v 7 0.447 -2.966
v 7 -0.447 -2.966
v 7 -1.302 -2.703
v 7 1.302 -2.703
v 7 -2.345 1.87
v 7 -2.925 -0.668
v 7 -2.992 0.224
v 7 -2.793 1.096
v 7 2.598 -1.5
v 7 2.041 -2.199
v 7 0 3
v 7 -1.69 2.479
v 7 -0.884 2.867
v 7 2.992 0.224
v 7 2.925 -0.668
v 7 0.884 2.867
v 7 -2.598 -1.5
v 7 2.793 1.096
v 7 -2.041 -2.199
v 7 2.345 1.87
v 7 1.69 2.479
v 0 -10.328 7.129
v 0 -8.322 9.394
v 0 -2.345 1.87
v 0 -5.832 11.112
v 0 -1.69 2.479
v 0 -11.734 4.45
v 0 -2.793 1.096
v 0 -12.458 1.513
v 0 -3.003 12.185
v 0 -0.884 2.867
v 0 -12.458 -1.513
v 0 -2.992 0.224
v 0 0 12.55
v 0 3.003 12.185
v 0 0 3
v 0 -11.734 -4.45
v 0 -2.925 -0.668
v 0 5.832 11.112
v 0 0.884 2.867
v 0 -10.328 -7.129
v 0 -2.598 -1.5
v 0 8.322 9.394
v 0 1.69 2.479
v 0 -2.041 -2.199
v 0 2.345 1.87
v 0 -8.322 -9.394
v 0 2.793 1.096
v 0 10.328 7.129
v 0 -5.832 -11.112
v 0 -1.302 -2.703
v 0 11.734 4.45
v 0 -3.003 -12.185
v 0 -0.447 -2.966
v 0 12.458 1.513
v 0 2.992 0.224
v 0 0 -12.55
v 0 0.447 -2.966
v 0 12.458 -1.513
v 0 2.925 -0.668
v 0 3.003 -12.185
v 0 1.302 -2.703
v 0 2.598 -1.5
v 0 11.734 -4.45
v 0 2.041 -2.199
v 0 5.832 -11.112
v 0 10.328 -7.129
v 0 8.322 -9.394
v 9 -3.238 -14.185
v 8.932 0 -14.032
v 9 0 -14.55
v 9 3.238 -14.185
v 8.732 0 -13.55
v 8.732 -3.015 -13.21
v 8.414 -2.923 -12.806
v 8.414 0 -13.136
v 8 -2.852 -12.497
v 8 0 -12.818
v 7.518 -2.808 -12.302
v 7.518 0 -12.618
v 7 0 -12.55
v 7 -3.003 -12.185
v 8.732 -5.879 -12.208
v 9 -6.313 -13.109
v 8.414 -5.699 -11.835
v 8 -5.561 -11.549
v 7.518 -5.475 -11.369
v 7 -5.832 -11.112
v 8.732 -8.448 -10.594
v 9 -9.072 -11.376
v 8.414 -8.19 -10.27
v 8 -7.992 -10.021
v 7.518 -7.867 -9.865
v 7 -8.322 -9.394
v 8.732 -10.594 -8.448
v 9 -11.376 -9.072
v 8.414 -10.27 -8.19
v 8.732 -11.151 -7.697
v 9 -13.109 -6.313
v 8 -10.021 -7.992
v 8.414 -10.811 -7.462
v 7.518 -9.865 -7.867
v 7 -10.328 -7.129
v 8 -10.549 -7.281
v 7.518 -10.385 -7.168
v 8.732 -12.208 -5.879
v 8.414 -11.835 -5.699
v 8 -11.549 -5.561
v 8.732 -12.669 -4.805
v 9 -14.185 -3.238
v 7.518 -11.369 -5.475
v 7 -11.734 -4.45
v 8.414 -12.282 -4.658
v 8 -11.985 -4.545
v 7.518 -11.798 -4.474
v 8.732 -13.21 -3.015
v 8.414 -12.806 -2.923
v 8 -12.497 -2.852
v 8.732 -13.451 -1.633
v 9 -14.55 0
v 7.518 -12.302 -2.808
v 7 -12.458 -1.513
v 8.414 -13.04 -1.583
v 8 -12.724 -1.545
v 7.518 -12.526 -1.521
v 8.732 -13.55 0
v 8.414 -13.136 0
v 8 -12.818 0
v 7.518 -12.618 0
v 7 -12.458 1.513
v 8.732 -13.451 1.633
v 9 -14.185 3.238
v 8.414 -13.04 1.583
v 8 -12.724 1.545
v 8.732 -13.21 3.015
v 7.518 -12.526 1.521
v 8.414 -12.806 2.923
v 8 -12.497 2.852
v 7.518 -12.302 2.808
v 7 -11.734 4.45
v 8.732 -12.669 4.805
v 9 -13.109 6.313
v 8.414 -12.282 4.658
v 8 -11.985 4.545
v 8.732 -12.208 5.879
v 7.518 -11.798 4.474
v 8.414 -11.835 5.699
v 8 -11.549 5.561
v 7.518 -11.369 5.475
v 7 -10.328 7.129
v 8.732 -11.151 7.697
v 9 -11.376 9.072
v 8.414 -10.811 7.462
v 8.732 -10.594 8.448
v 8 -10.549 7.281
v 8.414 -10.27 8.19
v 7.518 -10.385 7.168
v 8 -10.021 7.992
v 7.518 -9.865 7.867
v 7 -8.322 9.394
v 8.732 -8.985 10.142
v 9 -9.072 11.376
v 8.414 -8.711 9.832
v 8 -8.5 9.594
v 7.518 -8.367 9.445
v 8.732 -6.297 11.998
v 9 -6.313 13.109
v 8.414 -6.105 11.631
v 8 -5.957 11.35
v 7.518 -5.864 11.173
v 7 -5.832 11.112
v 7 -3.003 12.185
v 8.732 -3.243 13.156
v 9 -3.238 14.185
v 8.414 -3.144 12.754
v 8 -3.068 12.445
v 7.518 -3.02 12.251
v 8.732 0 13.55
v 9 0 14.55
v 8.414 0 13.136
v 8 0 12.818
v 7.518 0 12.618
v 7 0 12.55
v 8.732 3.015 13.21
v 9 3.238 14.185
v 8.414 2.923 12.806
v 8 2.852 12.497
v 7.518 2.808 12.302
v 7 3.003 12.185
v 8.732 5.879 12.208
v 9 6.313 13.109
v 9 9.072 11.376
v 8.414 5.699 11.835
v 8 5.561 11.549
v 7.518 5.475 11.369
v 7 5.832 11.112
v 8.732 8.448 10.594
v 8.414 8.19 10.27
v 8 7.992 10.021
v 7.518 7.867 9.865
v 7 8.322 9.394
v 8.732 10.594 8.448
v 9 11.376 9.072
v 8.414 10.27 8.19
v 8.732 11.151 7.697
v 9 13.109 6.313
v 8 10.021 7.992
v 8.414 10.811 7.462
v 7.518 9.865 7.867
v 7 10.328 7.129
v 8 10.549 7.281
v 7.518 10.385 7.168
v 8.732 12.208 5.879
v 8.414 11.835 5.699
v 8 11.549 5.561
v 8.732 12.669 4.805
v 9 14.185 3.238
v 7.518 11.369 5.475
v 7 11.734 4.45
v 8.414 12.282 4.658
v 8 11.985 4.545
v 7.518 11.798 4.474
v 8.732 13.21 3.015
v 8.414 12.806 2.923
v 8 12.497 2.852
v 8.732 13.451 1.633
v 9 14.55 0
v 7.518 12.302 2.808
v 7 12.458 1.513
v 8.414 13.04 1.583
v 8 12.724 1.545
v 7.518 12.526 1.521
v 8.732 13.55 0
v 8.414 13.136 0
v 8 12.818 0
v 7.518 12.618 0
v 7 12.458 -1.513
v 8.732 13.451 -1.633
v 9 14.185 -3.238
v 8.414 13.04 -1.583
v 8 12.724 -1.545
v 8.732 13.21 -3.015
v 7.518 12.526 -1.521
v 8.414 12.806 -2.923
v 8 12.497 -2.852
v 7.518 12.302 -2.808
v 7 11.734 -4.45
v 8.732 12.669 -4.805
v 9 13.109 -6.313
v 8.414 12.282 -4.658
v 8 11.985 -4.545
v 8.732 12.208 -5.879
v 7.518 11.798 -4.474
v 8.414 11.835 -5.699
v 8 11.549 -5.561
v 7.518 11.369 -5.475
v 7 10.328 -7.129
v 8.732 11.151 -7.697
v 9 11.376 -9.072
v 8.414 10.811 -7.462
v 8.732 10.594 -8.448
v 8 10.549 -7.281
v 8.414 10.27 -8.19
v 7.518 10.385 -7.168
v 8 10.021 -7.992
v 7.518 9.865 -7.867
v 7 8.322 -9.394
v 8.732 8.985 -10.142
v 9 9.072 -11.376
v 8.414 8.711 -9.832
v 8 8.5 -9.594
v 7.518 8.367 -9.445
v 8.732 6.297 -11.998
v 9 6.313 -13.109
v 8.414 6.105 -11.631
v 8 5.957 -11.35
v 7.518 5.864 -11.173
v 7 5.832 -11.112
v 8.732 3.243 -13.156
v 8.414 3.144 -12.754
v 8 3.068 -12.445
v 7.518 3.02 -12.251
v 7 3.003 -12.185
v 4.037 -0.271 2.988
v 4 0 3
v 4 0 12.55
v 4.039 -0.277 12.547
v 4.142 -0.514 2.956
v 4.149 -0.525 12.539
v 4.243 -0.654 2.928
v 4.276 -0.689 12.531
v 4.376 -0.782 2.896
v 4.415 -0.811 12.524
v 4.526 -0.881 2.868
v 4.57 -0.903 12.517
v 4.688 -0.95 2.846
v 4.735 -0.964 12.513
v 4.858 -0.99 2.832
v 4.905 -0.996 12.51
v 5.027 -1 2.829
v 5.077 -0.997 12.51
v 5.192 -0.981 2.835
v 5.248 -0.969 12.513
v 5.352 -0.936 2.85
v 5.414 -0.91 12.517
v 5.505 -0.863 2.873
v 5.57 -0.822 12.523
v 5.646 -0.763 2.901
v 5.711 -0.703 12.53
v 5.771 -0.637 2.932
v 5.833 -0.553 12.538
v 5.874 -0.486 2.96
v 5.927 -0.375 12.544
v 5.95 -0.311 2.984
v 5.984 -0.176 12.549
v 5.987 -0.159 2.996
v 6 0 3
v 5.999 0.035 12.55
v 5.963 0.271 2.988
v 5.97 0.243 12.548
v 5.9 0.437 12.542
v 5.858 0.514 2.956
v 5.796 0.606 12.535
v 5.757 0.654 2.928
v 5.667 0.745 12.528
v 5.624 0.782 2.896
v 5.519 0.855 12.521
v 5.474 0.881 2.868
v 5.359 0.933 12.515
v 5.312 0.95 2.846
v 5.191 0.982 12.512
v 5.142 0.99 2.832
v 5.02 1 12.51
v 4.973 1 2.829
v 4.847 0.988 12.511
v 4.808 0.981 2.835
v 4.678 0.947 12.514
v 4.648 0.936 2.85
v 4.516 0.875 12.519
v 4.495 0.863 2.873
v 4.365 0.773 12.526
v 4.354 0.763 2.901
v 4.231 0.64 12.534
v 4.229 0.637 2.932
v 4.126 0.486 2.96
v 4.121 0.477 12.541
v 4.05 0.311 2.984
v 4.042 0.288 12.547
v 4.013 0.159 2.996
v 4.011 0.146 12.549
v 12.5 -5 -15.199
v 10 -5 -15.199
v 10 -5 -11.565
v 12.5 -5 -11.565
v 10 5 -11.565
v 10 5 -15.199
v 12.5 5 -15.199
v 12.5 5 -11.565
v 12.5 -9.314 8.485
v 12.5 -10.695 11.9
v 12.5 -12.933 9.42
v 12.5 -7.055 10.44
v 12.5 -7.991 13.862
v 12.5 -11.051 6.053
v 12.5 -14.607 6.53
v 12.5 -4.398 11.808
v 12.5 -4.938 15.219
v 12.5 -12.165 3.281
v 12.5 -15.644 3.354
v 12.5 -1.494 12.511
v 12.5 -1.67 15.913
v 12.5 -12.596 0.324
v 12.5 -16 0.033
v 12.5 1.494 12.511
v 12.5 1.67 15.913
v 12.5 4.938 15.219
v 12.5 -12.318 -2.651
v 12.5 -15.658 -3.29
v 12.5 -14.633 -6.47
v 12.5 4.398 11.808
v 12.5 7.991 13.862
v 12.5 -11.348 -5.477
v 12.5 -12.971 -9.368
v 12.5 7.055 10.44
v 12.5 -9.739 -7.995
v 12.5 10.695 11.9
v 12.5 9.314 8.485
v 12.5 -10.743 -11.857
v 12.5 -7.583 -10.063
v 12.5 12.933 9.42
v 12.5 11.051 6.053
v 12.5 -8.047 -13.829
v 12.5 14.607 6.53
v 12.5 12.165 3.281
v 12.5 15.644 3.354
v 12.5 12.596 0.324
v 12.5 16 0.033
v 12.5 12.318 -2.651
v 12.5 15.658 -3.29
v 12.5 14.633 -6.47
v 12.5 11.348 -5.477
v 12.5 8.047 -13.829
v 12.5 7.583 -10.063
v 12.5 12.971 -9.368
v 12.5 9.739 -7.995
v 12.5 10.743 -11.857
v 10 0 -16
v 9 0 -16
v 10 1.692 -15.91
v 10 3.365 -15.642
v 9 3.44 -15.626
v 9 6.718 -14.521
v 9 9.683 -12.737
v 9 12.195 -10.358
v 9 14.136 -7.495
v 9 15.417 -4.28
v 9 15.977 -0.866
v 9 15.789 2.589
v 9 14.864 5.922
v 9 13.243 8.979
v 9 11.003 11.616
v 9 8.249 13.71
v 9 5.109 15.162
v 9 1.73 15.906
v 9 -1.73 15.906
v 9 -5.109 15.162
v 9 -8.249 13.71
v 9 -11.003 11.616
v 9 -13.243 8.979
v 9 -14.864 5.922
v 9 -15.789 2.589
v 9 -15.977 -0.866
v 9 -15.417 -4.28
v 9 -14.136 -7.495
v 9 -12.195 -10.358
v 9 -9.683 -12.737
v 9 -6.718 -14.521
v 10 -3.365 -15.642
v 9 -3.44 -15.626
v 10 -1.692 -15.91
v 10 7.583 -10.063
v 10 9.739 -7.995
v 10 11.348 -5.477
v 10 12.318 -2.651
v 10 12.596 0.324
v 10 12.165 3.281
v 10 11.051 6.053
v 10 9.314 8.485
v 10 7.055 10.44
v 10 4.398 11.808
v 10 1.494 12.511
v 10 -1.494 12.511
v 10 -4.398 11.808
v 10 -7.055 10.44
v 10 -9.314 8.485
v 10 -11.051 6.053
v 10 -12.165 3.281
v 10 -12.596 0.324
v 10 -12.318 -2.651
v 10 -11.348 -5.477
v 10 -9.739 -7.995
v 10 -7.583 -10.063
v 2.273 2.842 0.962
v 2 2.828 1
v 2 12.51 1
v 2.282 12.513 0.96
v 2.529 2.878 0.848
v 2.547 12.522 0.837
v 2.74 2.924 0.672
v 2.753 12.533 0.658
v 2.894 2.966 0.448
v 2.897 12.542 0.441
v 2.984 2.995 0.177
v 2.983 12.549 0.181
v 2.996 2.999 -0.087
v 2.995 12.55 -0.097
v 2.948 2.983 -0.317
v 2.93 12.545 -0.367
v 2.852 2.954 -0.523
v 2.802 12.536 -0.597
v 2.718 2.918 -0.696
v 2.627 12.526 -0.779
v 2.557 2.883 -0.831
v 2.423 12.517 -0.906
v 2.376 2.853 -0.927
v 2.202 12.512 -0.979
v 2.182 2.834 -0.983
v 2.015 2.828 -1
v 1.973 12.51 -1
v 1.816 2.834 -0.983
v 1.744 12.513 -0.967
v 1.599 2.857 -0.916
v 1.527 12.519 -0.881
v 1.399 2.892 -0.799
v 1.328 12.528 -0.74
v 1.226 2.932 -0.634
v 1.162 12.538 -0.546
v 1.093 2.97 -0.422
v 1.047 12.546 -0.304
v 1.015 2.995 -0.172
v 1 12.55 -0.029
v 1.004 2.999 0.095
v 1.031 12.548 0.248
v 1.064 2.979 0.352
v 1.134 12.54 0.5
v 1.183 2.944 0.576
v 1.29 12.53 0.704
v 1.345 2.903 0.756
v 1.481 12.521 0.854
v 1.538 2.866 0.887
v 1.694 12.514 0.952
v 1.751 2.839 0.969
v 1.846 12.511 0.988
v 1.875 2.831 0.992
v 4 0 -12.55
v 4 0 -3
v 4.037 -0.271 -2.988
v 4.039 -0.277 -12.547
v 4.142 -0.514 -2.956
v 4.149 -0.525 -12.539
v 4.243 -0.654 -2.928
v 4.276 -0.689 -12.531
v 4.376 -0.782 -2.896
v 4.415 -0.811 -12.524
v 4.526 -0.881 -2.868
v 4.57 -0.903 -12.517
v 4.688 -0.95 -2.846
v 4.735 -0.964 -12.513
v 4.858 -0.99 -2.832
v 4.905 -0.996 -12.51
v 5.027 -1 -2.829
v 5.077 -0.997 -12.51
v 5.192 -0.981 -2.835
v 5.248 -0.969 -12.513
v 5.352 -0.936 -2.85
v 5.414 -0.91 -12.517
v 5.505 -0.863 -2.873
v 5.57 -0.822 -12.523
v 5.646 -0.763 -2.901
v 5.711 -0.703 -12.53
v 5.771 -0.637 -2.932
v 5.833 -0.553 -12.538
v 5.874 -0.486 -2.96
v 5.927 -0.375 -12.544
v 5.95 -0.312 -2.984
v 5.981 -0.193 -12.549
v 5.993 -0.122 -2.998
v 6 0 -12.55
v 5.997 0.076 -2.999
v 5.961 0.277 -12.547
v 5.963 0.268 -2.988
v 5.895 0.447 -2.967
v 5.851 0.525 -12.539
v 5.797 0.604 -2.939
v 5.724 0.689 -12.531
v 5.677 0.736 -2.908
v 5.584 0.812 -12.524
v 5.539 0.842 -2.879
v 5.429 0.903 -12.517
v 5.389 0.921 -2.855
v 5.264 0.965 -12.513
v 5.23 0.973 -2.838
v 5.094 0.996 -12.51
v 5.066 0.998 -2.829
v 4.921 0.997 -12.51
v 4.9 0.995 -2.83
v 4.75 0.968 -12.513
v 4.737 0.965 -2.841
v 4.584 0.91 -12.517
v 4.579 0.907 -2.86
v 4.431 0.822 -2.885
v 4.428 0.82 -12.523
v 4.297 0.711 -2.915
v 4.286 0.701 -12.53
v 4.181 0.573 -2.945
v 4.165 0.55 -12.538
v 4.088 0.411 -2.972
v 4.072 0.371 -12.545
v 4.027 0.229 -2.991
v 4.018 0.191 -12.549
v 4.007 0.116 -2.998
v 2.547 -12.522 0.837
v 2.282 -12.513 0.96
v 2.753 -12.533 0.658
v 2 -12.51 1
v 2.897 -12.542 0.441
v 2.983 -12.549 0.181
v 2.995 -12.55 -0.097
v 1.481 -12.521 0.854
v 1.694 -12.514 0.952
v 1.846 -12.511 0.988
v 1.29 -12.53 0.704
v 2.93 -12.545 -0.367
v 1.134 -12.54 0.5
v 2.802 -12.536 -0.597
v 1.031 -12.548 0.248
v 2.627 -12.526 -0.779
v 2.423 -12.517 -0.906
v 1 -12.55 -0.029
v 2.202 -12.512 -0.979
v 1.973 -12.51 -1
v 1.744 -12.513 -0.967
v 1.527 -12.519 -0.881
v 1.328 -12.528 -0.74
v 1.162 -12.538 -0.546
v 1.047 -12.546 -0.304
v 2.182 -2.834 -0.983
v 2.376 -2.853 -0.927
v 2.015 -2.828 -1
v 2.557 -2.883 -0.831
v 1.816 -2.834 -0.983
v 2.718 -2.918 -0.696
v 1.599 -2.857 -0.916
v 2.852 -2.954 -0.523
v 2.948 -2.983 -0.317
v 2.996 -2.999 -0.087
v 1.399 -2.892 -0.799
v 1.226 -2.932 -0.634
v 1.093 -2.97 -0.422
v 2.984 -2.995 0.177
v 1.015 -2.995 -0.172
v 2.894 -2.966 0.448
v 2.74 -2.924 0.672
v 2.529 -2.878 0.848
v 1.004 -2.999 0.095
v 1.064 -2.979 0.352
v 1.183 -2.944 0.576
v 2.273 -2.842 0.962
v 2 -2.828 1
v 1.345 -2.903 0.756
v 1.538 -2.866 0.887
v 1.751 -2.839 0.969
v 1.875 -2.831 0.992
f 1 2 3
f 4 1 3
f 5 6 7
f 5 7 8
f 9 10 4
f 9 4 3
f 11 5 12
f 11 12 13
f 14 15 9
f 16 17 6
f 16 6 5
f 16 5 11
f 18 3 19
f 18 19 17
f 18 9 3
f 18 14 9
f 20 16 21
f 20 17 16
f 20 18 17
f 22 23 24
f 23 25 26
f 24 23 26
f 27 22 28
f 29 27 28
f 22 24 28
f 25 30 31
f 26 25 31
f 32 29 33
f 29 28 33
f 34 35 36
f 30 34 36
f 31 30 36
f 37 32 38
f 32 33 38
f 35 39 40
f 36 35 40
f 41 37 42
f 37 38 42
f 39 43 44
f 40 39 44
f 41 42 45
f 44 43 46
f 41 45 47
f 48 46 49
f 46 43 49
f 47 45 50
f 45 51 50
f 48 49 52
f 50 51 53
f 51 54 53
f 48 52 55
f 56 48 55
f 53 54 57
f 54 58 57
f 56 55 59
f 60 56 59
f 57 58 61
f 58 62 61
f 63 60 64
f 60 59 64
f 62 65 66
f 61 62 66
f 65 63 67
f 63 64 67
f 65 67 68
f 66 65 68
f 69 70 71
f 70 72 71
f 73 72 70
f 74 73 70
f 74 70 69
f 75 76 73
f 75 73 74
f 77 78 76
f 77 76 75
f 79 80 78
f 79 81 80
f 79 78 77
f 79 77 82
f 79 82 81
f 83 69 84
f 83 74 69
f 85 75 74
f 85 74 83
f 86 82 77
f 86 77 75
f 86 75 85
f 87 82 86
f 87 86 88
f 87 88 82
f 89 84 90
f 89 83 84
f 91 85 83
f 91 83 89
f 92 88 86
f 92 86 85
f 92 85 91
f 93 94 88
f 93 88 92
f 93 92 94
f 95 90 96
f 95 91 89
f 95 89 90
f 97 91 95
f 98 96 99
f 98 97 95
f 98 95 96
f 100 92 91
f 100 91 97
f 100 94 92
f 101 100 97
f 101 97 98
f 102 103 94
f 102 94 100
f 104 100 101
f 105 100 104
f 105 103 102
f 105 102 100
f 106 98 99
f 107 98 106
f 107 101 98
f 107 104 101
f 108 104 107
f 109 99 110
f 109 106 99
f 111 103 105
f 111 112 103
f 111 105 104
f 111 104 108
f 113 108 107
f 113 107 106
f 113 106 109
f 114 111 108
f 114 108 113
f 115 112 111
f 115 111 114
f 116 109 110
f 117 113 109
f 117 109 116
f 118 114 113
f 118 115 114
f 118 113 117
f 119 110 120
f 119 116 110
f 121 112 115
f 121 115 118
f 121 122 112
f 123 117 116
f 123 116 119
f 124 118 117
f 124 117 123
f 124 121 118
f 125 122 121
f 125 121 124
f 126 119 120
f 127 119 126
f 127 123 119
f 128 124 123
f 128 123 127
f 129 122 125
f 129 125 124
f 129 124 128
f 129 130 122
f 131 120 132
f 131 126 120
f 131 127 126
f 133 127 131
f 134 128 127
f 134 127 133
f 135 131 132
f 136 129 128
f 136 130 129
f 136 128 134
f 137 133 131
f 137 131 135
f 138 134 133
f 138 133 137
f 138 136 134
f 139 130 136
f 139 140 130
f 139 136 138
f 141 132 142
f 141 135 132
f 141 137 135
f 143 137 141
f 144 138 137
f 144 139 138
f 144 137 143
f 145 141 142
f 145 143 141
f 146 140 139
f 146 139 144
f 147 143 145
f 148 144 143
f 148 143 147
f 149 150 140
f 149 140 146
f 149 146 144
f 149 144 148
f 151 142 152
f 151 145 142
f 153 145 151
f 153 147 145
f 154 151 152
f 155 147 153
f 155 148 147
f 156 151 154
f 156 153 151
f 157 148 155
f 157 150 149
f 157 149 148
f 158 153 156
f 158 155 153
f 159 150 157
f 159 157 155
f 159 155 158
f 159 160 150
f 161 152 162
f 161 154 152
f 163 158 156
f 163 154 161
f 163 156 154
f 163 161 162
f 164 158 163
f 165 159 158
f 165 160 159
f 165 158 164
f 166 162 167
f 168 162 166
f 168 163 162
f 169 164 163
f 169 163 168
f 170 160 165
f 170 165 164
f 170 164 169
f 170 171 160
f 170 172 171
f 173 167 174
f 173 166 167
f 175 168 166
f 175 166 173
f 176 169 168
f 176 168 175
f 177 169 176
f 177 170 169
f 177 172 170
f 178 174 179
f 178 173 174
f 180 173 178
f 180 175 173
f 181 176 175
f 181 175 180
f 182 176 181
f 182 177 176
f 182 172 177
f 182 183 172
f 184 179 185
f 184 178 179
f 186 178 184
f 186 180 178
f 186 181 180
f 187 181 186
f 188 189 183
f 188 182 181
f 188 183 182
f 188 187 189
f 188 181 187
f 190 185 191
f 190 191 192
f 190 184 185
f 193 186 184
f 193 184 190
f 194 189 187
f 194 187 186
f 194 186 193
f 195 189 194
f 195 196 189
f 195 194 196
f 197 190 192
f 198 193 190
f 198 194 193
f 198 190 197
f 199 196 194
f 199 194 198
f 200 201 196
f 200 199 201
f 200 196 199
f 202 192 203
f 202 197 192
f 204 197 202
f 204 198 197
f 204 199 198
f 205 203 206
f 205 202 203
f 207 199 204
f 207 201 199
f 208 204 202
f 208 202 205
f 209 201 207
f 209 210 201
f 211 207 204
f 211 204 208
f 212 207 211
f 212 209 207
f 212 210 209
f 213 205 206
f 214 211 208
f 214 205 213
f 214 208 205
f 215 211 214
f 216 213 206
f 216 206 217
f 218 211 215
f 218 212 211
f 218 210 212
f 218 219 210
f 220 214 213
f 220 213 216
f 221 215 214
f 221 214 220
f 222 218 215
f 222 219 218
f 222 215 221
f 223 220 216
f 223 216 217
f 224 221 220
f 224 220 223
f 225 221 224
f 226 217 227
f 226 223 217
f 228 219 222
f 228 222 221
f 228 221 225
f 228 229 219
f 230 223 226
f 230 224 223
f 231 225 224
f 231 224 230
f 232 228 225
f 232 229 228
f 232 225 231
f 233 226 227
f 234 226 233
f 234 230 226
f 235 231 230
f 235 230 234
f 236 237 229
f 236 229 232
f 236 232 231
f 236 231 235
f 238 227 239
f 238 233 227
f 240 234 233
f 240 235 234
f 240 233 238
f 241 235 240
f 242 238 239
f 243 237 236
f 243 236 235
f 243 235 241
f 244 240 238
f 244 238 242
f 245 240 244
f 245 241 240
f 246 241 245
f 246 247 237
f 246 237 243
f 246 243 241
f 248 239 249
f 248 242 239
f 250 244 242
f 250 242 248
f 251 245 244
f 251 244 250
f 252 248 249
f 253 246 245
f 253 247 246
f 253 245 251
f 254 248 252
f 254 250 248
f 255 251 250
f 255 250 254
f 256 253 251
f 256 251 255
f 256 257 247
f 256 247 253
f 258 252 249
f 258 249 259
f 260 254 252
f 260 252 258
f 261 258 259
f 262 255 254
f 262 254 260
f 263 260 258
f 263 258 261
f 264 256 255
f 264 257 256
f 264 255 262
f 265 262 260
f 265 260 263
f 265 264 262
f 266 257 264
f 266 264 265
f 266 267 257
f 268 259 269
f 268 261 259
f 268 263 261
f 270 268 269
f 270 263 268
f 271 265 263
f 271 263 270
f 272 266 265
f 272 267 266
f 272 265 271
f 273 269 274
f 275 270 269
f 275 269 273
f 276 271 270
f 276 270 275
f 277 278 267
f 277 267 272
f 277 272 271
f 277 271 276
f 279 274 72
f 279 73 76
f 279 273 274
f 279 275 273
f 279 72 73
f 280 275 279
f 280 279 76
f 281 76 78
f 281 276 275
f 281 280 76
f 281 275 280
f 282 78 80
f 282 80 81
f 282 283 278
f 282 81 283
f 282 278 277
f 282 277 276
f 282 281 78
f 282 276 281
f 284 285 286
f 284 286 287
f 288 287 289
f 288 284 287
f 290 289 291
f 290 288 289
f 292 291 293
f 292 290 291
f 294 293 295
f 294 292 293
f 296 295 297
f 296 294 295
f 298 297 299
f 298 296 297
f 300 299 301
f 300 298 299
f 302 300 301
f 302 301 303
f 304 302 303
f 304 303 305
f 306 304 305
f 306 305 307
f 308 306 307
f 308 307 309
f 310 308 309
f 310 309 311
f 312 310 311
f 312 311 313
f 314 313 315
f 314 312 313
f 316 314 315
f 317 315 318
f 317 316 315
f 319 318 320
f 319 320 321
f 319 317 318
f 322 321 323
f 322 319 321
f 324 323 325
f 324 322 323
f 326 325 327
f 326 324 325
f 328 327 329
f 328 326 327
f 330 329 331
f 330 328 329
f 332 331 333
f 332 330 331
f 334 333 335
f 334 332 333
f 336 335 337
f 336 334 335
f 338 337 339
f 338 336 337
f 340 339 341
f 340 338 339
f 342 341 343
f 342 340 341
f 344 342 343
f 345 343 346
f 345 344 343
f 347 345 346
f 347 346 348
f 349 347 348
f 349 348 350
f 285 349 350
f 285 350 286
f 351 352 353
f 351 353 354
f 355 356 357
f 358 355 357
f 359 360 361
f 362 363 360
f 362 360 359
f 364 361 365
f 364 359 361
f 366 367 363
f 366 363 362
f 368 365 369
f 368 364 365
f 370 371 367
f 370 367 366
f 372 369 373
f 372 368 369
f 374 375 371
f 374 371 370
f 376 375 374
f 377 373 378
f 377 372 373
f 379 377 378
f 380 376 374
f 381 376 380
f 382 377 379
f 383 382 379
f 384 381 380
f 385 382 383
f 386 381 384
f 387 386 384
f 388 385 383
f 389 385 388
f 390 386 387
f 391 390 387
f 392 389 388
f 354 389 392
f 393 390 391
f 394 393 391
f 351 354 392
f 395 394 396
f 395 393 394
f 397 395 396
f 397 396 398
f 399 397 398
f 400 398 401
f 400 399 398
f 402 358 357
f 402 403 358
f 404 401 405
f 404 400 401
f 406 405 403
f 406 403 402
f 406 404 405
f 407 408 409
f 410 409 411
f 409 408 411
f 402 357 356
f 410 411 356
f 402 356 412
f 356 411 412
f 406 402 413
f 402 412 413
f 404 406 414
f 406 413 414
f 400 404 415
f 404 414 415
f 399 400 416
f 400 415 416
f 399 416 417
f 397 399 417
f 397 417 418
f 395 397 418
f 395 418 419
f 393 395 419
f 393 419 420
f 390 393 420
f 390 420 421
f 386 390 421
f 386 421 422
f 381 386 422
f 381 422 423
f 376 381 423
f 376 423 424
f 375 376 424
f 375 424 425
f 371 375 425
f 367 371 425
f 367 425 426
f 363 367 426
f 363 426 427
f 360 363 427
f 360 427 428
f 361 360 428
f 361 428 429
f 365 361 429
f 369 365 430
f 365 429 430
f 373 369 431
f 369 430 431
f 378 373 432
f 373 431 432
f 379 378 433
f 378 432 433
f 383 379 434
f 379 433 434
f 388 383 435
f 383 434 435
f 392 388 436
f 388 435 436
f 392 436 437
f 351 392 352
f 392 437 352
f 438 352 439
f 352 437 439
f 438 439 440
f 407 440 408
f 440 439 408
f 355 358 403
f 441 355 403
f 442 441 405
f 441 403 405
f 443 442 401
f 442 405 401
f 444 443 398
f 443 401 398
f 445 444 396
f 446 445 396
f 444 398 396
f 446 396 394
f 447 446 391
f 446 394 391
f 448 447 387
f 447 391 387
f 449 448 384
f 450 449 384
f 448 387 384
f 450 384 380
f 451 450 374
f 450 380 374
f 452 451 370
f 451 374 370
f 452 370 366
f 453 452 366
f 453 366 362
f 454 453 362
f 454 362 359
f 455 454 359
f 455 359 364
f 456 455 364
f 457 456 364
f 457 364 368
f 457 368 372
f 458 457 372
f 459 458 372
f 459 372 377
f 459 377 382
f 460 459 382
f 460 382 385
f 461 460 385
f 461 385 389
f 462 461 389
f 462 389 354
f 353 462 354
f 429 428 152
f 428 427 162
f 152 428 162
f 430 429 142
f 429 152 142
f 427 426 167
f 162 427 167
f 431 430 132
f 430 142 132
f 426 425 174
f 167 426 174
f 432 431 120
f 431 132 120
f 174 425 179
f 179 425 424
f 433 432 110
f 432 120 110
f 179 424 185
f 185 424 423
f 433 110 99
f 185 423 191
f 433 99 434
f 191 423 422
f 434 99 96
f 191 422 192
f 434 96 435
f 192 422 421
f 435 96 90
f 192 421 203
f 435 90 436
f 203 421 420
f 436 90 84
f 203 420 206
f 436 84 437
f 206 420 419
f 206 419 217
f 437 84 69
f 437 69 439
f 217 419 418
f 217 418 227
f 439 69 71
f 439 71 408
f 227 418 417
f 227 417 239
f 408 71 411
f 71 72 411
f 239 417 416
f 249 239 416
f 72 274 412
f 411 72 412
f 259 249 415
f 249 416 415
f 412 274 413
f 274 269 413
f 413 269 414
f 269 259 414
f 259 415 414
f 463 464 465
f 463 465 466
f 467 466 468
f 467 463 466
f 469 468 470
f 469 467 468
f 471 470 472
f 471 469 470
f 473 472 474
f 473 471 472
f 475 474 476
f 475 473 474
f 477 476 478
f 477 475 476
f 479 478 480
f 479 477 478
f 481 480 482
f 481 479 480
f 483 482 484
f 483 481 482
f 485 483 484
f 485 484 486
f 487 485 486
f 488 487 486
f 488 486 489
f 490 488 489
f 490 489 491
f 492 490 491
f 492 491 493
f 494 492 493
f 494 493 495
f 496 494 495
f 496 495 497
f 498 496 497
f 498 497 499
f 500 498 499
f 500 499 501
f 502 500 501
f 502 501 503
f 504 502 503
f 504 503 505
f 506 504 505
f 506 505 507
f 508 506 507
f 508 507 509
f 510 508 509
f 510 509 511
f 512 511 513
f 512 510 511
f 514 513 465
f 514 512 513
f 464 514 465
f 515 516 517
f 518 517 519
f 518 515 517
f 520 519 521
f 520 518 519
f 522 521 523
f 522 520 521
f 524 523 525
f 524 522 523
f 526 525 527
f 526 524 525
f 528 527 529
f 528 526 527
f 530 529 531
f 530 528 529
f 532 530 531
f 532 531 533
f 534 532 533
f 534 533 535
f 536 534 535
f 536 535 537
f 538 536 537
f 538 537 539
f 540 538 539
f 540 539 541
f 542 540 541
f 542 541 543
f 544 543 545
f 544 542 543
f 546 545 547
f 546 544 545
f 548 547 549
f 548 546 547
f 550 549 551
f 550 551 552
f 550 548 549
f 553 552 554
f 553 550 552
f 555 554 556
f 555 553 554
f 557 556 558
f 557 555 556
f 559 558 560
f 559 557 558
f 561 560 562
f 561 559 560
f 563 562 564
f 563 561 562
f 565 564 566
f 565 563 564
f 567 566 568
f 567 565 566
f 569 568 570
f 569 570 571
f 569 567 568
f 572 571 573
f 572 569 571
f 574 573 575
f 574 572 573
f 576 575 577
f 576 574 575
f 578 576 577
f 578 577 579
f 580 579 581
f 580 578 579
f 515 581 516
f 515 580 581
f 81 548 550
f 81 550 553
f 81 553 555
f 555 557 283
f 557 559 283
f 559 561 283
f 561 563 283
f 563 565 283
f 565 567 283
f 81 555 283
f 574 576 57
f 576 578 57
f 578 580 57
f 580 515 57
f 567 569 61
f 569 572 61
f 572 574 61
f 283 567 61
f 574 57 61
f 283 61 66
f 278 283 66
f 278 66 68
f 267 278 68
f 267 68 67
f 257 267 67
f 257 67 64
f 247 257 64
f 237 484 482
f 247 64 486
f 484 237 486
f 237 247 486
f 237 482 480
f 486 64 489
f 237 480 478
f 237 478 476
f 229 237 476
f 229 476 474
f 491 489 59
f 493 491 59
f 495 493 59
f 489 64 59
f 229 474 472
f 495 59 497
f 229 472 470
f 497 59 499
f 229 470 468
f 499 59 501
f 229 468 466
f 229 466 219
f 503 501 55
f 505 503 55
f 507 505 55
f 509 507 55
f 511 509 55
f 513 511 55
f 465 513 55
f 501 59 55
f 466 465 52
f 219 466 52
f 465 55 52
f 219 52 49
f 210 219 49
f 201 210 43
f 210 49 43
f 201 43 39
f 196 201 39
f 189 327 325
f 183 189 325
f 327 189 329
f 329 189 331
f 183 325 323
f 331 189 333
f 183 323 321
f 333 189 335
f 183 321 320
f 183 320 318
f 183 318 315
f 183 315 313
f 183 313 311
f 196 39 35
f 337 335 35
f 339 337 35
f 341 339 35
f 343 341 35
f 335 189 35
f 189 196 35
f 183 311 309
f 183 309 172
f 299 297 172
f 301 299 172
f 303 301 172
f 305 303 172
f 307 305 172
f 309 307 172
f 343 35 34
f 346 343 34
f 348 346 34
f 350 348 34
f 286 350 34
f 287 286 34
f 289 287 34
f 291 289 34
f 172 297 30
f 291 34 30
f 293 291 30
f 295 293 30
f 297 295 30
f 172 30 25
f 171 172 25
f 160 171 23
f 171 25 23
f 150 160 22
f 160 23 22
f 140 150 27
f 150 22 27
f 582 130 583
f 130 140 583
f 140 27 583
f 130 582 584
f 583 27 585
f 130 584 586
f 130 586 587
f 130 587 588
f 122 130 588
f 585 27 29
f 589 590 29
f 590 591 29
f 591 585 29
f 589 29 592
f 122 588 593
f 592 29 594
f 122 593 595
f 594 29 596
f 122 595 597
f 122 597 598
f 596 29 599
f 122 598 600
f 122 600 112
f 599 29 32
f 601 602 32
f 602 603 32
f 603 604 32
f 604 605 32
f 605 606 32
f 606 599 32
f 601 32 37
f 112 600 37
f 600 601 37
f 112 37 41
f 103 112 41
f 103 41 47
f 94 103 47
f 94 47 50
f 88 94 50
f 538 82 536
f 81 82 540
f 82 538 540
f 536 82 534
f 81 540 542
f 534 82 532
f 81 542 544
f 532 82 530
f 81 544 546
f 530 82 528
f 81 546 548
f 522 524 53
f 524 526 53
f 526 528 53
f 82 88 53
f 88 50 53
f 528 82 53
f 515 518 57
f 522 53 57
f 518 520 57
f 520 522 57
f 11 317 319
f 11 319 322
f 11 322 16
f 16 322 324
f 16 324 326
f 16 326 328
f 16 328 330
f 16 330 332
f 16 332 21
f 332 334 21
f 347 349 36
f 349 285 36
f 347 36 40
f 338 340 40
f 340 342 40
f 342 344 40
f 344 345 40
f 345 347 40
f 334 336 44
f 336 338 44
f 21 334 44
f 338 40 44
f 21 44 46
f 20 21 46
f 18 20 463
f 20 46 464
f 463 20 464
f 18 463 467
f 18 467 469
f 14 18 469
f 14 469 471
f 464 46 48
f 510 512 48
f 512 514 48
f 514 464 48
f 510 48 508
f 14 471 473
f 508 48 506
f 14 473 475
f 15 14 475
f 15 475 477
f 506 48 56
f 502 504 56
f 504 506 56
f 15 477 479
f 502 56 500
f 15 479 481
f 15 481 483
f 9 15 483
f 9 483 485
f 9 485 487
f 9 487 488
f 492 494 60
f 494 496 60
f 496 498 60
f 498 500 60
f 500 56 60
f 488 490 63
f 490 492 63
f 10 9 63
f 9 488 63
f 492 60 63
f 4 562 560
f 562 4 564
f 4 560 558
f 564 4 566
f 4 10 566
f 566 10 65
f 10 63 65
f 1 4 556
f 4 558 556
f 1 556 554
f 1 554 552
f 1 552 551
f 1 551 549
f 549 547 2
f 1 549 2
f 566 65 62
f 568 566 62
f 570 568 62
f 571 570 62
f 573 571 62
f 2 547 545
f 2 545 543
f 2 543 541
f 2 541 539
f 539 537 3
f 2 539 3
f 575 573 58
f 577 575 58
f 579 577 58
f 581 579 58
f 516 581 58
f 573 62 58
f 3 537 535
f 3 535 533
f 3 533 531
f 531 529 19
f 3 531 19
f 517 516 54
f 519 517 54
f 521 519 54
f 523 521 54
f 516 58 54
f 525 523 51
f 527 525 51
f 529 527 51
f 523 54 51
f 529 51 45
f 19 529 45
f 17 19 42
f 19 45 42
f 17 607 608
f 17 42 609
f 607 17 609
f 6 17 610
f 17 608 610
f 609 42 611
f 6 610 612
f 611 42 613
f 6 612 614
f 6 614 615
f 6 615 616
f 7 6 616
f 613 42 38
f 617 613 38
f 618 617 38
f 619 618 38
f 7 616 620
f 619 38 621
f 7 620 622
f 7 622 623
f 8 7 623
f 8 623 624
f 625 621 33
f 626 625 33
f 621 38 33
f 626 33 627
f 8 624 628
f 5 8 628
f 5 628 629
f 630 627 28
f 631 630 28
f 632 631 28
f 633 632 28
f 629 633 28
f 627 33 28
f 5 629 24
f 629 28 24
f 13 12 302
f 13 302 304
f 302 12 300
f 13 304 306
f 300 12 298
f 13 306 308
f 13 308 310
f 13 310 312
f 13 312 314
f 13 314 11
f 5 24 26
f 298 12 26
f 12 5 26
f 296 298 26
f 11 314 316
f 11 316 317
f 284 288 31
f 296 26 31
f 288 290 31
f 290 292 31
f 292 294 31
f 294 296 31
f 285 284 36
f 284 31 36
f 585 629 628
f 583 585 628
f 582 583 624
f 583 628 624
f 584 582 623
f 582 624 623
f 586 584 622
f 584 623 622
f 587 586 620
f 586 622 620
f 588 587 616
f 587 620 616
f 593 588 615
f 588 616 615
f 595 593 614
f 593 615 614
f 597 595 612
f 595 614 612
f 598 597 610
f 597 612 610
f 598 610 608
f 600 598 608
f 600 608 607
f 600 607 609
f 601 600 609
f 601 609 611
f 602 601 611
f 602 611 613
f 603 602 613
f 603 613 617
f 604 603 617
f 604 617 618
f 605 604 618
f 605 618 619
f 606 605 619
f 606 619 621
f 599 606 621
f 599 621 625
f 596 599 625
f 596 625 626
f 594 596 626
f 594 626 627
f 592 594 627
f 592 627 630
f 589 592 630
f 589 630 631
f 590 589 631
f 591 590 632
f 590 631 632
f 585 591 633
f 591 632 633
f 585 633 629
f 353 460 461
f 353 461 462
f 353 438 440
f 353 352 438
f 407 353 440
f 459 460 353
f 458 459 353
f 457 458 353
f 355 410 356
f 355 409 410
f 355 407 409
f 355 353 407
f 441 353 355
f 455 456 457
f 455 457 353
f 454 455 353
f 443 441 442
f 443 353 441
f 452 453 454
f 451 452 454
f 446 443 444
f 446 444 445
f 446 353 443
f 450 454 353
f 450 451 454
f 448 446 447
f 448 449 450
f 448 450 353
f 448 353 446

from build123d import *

# Parameters (mm, degrees)
SKETCH_1_R                      = 12.55
EXTRUDE_1_DEPTH                 = 10
SKETCH_2_R                      = 3
CUT_EXTRUDE_1_DEPTH             = 7
CUT_EXTRUDE_2_REACH             = 22.372
SKETCH_3_R                      = 1
CUT_EXTRUDE_2_DIRECTION_2_REACH = 22.372
CUT_EXTRUDE_3_DEPTH             = 21
CUT_EXTRUDE_3_DEPTH_BACK        = 19
SKETCH_4_R                      = 1
EXTRUDE_2_DEPTH                 = 2.5
EXTRUDE_2_DEPTH_BACK            = 1
SKETCH_5_R                      = 16
SKETCH_6_R                      = 12.6
CUT_EXTRUDE_4_DEPTH             = 2.5
FILLET_1_R                      = 2
SKETCH_7_W                      = 2.5
SKETCH_7_H                      = 10
CUT_EXTRUDE_5_DEPTH             = 21.5


with BuildPart() as part:
    # 草图1 → 凸台-拉伸1 (new body)
    with BuildSketch(Plane(origin=(0, 0, 0), x_dir=(0, 0, -1), z_dir=(1, 0, 0))):
        Circle(SKETCH_1_R)
    extrude(amount=EXTRUDE_1_DEPTH)

    # 草图2 → 切除-拉伸1 (cut)
    with BuildSketch(Plane.ZY):
        Circle(SKETCH_2_R)
    extrude(amount=-CUT_EXTRUDE_1_DEPTH, mode=Mode.SUBTRACT)

    # 草图3 → 切除-拉伸2 (cut, up to next)
    with BuildSketch(Plane(origin=(0, 0, 0), x_dir=(1, 0, 0), z_dir=(0, 1, 0)), mode=Mode.PRIVATE) as cut_extrude_2_sk1:
        with Locations(Location((2, 0, 0), (0, 0, 270))):
            Circle(SKETCH_3_R)
    cut_extrude_2_tool1 = extrude(cut_extrude_2_sk1.sketch, amount=-CUT_EXTRUDE_2_REACH, mode=Mode.PRIVATE) & part.part
    add(cut_extrude_2_tool1.solids().sort_by_distance((2, 0, 0))[0], mode=Mode.SUBTRACT)

    # 草图3 → 切除-拉伸2 direction 2 (cut, up to next)
    with BuildSketch(Plane(origin=(0, 0, 0), x_dir=(1, 0, 0), z_dir=(0, 1, 0)), mode=Mode.PRIVATE) as cut_extrude_2_direction_2_sk1:
        with Locations(Location((2, 0, 0), (0, 0, 270))):
            Circle(SKETCH_3_R)
    cut_extrude_2_direction_2_tool1 = extrude(cut_extrude_2_direction_2_sk1.sketch, amount=CUT_EXTRUDE_2_DIRECTION_2_REACH, mode=Mode.PRIVATE) & part.part
    add(cut_extrude_2_direction_2_tool1.solids().sort_by_distance((2, 0, 0))[0], mode=Mode.SUBTRACT)

    # 草图4 → 切除-拉伸3 (cut, two sides: drawn at the far end of the back side and taken through both)
    with BuildSketch(Plane.XY.offset(-CUT_EXTRUDE_3_DEPTH_BACK)):
        with Locations(Location((5, 0, 0), (0, 0, 180))):
            Circle(SKETCH_4_R)
    extrude(amount=CUT_EXTRUDE_3_DEPTH + CUT_EXTRUDE_3_DEPTH_BACK, mode=Mode.SUBTRACT)

    # 草图5 → 凸台-拉伸2 (add, two sides: drawn at the far end of the back side and taken through both)
    with BuildSketch(Plane(origin=(10, 0, 0), x_dir=(0, 0, -1), z_dir=(1, 0, 0)).offset(-EXTRUDE_2_DEPTH_BACK)):
        Circle(SKETCH_5_R)
    extrude(amount=EXTRUDE_2_DEPTH + EXTRUDE_2_DEPTH_BACK)

    # 草图6 → 切除-拉伸4 (cut)
    with BuildSketch(Plane(origin=(12.5, 0, 0), x_dir=(0, 0, -1), z_dir=(1, 0, 0))):
        Circle(SKETCH_6_R)
    extrude(amount=-CUT_EXTRUDE_4_DEPTH, mode=Mode.SUBTRACT)

    # 圆角1
    fillet_1_edges = [part.edges().sort_by_distance(p)[0] for p in [
        (9, 0, 12.55),
    ]]
    fillet(fillet_1_edges, radius=FILLET_1_R)

    # 草图7 → 切除-拉伸5 (cut)
    with BuildSketch(Plane.XY):
        with Locations((11.25, 0)):
            Rectangle(SKETCH_7_W, SKETCH_7_H)
    extrude(amount=-CUT_EXTRUDE_5_DEPTH, mode=Mode.SUBTRACT)


solid = part.part
